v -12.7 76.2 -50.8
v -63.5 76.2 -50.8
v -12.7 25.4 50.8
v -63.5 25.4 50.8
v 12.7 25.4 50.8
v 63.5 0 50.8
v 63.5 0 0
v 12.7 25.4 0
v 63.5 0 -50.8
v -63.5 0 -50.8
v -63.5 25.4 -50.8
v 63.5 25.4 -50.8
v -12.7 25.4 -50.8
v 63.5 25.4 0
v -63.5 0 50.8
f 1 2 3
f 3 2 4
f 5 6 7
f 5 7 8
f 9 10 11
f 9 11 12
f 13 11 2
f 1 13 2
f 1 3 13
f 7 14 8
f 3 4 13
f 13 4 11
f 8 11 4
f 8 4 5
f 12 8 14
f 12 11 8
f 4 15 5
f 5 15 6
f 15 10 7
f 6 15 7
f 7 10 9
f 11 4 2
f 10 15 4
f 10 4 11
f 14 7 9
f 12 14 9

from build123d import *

# Parameters (mm, degrees)
SKETCH1_W           = 127
SKETCH1_H           = 101.6
BOSS_EXTRUDE1_DEPTH = 25.4
CUT_EXTRUDE1_DEPTH  = 50.8
BOSS_EXTRUDE2_DEPTH = 50.8


with BuildPart() as part:
    # Sketch1 → Boss-Extrude1 (new body)
    with BuildSketch(Plane(origin=(0, 0, 0), x_dir=(1, 0, 0), z_dir=(0, 1, 0))):
        Rectangle(SKETCH1_W, SKETCH1_H)
    extrude(amount=BOSS_EXTRUDE1_DEPTH)

    # Sketch2 → Cut-Extrude1 (cut)
    with BuildSketch(Plane.XY.offset(50.8)):
        Polygon((63.5, 0), (12.7, 25.4), (63.5, 25.4), align=None)
    extrude(amount=-CUT_EXTRUDE1_DEPTH, mode=Mode.SUBTRACT)


with BuildPart() as body_2:
    # Sketch3 → Boss-Extrude2 (new body)
    with BuildSketch(Plane.ZY.offset(63.5)):
        Polygon((-50.8, 25.4), (-50.8, 76.2), (50.8, 25.4), align=None)
    extrude(amount=-BOSS_EXTRUDE2_DEPTH)


solid = Compound([part.part, body_2.part])
